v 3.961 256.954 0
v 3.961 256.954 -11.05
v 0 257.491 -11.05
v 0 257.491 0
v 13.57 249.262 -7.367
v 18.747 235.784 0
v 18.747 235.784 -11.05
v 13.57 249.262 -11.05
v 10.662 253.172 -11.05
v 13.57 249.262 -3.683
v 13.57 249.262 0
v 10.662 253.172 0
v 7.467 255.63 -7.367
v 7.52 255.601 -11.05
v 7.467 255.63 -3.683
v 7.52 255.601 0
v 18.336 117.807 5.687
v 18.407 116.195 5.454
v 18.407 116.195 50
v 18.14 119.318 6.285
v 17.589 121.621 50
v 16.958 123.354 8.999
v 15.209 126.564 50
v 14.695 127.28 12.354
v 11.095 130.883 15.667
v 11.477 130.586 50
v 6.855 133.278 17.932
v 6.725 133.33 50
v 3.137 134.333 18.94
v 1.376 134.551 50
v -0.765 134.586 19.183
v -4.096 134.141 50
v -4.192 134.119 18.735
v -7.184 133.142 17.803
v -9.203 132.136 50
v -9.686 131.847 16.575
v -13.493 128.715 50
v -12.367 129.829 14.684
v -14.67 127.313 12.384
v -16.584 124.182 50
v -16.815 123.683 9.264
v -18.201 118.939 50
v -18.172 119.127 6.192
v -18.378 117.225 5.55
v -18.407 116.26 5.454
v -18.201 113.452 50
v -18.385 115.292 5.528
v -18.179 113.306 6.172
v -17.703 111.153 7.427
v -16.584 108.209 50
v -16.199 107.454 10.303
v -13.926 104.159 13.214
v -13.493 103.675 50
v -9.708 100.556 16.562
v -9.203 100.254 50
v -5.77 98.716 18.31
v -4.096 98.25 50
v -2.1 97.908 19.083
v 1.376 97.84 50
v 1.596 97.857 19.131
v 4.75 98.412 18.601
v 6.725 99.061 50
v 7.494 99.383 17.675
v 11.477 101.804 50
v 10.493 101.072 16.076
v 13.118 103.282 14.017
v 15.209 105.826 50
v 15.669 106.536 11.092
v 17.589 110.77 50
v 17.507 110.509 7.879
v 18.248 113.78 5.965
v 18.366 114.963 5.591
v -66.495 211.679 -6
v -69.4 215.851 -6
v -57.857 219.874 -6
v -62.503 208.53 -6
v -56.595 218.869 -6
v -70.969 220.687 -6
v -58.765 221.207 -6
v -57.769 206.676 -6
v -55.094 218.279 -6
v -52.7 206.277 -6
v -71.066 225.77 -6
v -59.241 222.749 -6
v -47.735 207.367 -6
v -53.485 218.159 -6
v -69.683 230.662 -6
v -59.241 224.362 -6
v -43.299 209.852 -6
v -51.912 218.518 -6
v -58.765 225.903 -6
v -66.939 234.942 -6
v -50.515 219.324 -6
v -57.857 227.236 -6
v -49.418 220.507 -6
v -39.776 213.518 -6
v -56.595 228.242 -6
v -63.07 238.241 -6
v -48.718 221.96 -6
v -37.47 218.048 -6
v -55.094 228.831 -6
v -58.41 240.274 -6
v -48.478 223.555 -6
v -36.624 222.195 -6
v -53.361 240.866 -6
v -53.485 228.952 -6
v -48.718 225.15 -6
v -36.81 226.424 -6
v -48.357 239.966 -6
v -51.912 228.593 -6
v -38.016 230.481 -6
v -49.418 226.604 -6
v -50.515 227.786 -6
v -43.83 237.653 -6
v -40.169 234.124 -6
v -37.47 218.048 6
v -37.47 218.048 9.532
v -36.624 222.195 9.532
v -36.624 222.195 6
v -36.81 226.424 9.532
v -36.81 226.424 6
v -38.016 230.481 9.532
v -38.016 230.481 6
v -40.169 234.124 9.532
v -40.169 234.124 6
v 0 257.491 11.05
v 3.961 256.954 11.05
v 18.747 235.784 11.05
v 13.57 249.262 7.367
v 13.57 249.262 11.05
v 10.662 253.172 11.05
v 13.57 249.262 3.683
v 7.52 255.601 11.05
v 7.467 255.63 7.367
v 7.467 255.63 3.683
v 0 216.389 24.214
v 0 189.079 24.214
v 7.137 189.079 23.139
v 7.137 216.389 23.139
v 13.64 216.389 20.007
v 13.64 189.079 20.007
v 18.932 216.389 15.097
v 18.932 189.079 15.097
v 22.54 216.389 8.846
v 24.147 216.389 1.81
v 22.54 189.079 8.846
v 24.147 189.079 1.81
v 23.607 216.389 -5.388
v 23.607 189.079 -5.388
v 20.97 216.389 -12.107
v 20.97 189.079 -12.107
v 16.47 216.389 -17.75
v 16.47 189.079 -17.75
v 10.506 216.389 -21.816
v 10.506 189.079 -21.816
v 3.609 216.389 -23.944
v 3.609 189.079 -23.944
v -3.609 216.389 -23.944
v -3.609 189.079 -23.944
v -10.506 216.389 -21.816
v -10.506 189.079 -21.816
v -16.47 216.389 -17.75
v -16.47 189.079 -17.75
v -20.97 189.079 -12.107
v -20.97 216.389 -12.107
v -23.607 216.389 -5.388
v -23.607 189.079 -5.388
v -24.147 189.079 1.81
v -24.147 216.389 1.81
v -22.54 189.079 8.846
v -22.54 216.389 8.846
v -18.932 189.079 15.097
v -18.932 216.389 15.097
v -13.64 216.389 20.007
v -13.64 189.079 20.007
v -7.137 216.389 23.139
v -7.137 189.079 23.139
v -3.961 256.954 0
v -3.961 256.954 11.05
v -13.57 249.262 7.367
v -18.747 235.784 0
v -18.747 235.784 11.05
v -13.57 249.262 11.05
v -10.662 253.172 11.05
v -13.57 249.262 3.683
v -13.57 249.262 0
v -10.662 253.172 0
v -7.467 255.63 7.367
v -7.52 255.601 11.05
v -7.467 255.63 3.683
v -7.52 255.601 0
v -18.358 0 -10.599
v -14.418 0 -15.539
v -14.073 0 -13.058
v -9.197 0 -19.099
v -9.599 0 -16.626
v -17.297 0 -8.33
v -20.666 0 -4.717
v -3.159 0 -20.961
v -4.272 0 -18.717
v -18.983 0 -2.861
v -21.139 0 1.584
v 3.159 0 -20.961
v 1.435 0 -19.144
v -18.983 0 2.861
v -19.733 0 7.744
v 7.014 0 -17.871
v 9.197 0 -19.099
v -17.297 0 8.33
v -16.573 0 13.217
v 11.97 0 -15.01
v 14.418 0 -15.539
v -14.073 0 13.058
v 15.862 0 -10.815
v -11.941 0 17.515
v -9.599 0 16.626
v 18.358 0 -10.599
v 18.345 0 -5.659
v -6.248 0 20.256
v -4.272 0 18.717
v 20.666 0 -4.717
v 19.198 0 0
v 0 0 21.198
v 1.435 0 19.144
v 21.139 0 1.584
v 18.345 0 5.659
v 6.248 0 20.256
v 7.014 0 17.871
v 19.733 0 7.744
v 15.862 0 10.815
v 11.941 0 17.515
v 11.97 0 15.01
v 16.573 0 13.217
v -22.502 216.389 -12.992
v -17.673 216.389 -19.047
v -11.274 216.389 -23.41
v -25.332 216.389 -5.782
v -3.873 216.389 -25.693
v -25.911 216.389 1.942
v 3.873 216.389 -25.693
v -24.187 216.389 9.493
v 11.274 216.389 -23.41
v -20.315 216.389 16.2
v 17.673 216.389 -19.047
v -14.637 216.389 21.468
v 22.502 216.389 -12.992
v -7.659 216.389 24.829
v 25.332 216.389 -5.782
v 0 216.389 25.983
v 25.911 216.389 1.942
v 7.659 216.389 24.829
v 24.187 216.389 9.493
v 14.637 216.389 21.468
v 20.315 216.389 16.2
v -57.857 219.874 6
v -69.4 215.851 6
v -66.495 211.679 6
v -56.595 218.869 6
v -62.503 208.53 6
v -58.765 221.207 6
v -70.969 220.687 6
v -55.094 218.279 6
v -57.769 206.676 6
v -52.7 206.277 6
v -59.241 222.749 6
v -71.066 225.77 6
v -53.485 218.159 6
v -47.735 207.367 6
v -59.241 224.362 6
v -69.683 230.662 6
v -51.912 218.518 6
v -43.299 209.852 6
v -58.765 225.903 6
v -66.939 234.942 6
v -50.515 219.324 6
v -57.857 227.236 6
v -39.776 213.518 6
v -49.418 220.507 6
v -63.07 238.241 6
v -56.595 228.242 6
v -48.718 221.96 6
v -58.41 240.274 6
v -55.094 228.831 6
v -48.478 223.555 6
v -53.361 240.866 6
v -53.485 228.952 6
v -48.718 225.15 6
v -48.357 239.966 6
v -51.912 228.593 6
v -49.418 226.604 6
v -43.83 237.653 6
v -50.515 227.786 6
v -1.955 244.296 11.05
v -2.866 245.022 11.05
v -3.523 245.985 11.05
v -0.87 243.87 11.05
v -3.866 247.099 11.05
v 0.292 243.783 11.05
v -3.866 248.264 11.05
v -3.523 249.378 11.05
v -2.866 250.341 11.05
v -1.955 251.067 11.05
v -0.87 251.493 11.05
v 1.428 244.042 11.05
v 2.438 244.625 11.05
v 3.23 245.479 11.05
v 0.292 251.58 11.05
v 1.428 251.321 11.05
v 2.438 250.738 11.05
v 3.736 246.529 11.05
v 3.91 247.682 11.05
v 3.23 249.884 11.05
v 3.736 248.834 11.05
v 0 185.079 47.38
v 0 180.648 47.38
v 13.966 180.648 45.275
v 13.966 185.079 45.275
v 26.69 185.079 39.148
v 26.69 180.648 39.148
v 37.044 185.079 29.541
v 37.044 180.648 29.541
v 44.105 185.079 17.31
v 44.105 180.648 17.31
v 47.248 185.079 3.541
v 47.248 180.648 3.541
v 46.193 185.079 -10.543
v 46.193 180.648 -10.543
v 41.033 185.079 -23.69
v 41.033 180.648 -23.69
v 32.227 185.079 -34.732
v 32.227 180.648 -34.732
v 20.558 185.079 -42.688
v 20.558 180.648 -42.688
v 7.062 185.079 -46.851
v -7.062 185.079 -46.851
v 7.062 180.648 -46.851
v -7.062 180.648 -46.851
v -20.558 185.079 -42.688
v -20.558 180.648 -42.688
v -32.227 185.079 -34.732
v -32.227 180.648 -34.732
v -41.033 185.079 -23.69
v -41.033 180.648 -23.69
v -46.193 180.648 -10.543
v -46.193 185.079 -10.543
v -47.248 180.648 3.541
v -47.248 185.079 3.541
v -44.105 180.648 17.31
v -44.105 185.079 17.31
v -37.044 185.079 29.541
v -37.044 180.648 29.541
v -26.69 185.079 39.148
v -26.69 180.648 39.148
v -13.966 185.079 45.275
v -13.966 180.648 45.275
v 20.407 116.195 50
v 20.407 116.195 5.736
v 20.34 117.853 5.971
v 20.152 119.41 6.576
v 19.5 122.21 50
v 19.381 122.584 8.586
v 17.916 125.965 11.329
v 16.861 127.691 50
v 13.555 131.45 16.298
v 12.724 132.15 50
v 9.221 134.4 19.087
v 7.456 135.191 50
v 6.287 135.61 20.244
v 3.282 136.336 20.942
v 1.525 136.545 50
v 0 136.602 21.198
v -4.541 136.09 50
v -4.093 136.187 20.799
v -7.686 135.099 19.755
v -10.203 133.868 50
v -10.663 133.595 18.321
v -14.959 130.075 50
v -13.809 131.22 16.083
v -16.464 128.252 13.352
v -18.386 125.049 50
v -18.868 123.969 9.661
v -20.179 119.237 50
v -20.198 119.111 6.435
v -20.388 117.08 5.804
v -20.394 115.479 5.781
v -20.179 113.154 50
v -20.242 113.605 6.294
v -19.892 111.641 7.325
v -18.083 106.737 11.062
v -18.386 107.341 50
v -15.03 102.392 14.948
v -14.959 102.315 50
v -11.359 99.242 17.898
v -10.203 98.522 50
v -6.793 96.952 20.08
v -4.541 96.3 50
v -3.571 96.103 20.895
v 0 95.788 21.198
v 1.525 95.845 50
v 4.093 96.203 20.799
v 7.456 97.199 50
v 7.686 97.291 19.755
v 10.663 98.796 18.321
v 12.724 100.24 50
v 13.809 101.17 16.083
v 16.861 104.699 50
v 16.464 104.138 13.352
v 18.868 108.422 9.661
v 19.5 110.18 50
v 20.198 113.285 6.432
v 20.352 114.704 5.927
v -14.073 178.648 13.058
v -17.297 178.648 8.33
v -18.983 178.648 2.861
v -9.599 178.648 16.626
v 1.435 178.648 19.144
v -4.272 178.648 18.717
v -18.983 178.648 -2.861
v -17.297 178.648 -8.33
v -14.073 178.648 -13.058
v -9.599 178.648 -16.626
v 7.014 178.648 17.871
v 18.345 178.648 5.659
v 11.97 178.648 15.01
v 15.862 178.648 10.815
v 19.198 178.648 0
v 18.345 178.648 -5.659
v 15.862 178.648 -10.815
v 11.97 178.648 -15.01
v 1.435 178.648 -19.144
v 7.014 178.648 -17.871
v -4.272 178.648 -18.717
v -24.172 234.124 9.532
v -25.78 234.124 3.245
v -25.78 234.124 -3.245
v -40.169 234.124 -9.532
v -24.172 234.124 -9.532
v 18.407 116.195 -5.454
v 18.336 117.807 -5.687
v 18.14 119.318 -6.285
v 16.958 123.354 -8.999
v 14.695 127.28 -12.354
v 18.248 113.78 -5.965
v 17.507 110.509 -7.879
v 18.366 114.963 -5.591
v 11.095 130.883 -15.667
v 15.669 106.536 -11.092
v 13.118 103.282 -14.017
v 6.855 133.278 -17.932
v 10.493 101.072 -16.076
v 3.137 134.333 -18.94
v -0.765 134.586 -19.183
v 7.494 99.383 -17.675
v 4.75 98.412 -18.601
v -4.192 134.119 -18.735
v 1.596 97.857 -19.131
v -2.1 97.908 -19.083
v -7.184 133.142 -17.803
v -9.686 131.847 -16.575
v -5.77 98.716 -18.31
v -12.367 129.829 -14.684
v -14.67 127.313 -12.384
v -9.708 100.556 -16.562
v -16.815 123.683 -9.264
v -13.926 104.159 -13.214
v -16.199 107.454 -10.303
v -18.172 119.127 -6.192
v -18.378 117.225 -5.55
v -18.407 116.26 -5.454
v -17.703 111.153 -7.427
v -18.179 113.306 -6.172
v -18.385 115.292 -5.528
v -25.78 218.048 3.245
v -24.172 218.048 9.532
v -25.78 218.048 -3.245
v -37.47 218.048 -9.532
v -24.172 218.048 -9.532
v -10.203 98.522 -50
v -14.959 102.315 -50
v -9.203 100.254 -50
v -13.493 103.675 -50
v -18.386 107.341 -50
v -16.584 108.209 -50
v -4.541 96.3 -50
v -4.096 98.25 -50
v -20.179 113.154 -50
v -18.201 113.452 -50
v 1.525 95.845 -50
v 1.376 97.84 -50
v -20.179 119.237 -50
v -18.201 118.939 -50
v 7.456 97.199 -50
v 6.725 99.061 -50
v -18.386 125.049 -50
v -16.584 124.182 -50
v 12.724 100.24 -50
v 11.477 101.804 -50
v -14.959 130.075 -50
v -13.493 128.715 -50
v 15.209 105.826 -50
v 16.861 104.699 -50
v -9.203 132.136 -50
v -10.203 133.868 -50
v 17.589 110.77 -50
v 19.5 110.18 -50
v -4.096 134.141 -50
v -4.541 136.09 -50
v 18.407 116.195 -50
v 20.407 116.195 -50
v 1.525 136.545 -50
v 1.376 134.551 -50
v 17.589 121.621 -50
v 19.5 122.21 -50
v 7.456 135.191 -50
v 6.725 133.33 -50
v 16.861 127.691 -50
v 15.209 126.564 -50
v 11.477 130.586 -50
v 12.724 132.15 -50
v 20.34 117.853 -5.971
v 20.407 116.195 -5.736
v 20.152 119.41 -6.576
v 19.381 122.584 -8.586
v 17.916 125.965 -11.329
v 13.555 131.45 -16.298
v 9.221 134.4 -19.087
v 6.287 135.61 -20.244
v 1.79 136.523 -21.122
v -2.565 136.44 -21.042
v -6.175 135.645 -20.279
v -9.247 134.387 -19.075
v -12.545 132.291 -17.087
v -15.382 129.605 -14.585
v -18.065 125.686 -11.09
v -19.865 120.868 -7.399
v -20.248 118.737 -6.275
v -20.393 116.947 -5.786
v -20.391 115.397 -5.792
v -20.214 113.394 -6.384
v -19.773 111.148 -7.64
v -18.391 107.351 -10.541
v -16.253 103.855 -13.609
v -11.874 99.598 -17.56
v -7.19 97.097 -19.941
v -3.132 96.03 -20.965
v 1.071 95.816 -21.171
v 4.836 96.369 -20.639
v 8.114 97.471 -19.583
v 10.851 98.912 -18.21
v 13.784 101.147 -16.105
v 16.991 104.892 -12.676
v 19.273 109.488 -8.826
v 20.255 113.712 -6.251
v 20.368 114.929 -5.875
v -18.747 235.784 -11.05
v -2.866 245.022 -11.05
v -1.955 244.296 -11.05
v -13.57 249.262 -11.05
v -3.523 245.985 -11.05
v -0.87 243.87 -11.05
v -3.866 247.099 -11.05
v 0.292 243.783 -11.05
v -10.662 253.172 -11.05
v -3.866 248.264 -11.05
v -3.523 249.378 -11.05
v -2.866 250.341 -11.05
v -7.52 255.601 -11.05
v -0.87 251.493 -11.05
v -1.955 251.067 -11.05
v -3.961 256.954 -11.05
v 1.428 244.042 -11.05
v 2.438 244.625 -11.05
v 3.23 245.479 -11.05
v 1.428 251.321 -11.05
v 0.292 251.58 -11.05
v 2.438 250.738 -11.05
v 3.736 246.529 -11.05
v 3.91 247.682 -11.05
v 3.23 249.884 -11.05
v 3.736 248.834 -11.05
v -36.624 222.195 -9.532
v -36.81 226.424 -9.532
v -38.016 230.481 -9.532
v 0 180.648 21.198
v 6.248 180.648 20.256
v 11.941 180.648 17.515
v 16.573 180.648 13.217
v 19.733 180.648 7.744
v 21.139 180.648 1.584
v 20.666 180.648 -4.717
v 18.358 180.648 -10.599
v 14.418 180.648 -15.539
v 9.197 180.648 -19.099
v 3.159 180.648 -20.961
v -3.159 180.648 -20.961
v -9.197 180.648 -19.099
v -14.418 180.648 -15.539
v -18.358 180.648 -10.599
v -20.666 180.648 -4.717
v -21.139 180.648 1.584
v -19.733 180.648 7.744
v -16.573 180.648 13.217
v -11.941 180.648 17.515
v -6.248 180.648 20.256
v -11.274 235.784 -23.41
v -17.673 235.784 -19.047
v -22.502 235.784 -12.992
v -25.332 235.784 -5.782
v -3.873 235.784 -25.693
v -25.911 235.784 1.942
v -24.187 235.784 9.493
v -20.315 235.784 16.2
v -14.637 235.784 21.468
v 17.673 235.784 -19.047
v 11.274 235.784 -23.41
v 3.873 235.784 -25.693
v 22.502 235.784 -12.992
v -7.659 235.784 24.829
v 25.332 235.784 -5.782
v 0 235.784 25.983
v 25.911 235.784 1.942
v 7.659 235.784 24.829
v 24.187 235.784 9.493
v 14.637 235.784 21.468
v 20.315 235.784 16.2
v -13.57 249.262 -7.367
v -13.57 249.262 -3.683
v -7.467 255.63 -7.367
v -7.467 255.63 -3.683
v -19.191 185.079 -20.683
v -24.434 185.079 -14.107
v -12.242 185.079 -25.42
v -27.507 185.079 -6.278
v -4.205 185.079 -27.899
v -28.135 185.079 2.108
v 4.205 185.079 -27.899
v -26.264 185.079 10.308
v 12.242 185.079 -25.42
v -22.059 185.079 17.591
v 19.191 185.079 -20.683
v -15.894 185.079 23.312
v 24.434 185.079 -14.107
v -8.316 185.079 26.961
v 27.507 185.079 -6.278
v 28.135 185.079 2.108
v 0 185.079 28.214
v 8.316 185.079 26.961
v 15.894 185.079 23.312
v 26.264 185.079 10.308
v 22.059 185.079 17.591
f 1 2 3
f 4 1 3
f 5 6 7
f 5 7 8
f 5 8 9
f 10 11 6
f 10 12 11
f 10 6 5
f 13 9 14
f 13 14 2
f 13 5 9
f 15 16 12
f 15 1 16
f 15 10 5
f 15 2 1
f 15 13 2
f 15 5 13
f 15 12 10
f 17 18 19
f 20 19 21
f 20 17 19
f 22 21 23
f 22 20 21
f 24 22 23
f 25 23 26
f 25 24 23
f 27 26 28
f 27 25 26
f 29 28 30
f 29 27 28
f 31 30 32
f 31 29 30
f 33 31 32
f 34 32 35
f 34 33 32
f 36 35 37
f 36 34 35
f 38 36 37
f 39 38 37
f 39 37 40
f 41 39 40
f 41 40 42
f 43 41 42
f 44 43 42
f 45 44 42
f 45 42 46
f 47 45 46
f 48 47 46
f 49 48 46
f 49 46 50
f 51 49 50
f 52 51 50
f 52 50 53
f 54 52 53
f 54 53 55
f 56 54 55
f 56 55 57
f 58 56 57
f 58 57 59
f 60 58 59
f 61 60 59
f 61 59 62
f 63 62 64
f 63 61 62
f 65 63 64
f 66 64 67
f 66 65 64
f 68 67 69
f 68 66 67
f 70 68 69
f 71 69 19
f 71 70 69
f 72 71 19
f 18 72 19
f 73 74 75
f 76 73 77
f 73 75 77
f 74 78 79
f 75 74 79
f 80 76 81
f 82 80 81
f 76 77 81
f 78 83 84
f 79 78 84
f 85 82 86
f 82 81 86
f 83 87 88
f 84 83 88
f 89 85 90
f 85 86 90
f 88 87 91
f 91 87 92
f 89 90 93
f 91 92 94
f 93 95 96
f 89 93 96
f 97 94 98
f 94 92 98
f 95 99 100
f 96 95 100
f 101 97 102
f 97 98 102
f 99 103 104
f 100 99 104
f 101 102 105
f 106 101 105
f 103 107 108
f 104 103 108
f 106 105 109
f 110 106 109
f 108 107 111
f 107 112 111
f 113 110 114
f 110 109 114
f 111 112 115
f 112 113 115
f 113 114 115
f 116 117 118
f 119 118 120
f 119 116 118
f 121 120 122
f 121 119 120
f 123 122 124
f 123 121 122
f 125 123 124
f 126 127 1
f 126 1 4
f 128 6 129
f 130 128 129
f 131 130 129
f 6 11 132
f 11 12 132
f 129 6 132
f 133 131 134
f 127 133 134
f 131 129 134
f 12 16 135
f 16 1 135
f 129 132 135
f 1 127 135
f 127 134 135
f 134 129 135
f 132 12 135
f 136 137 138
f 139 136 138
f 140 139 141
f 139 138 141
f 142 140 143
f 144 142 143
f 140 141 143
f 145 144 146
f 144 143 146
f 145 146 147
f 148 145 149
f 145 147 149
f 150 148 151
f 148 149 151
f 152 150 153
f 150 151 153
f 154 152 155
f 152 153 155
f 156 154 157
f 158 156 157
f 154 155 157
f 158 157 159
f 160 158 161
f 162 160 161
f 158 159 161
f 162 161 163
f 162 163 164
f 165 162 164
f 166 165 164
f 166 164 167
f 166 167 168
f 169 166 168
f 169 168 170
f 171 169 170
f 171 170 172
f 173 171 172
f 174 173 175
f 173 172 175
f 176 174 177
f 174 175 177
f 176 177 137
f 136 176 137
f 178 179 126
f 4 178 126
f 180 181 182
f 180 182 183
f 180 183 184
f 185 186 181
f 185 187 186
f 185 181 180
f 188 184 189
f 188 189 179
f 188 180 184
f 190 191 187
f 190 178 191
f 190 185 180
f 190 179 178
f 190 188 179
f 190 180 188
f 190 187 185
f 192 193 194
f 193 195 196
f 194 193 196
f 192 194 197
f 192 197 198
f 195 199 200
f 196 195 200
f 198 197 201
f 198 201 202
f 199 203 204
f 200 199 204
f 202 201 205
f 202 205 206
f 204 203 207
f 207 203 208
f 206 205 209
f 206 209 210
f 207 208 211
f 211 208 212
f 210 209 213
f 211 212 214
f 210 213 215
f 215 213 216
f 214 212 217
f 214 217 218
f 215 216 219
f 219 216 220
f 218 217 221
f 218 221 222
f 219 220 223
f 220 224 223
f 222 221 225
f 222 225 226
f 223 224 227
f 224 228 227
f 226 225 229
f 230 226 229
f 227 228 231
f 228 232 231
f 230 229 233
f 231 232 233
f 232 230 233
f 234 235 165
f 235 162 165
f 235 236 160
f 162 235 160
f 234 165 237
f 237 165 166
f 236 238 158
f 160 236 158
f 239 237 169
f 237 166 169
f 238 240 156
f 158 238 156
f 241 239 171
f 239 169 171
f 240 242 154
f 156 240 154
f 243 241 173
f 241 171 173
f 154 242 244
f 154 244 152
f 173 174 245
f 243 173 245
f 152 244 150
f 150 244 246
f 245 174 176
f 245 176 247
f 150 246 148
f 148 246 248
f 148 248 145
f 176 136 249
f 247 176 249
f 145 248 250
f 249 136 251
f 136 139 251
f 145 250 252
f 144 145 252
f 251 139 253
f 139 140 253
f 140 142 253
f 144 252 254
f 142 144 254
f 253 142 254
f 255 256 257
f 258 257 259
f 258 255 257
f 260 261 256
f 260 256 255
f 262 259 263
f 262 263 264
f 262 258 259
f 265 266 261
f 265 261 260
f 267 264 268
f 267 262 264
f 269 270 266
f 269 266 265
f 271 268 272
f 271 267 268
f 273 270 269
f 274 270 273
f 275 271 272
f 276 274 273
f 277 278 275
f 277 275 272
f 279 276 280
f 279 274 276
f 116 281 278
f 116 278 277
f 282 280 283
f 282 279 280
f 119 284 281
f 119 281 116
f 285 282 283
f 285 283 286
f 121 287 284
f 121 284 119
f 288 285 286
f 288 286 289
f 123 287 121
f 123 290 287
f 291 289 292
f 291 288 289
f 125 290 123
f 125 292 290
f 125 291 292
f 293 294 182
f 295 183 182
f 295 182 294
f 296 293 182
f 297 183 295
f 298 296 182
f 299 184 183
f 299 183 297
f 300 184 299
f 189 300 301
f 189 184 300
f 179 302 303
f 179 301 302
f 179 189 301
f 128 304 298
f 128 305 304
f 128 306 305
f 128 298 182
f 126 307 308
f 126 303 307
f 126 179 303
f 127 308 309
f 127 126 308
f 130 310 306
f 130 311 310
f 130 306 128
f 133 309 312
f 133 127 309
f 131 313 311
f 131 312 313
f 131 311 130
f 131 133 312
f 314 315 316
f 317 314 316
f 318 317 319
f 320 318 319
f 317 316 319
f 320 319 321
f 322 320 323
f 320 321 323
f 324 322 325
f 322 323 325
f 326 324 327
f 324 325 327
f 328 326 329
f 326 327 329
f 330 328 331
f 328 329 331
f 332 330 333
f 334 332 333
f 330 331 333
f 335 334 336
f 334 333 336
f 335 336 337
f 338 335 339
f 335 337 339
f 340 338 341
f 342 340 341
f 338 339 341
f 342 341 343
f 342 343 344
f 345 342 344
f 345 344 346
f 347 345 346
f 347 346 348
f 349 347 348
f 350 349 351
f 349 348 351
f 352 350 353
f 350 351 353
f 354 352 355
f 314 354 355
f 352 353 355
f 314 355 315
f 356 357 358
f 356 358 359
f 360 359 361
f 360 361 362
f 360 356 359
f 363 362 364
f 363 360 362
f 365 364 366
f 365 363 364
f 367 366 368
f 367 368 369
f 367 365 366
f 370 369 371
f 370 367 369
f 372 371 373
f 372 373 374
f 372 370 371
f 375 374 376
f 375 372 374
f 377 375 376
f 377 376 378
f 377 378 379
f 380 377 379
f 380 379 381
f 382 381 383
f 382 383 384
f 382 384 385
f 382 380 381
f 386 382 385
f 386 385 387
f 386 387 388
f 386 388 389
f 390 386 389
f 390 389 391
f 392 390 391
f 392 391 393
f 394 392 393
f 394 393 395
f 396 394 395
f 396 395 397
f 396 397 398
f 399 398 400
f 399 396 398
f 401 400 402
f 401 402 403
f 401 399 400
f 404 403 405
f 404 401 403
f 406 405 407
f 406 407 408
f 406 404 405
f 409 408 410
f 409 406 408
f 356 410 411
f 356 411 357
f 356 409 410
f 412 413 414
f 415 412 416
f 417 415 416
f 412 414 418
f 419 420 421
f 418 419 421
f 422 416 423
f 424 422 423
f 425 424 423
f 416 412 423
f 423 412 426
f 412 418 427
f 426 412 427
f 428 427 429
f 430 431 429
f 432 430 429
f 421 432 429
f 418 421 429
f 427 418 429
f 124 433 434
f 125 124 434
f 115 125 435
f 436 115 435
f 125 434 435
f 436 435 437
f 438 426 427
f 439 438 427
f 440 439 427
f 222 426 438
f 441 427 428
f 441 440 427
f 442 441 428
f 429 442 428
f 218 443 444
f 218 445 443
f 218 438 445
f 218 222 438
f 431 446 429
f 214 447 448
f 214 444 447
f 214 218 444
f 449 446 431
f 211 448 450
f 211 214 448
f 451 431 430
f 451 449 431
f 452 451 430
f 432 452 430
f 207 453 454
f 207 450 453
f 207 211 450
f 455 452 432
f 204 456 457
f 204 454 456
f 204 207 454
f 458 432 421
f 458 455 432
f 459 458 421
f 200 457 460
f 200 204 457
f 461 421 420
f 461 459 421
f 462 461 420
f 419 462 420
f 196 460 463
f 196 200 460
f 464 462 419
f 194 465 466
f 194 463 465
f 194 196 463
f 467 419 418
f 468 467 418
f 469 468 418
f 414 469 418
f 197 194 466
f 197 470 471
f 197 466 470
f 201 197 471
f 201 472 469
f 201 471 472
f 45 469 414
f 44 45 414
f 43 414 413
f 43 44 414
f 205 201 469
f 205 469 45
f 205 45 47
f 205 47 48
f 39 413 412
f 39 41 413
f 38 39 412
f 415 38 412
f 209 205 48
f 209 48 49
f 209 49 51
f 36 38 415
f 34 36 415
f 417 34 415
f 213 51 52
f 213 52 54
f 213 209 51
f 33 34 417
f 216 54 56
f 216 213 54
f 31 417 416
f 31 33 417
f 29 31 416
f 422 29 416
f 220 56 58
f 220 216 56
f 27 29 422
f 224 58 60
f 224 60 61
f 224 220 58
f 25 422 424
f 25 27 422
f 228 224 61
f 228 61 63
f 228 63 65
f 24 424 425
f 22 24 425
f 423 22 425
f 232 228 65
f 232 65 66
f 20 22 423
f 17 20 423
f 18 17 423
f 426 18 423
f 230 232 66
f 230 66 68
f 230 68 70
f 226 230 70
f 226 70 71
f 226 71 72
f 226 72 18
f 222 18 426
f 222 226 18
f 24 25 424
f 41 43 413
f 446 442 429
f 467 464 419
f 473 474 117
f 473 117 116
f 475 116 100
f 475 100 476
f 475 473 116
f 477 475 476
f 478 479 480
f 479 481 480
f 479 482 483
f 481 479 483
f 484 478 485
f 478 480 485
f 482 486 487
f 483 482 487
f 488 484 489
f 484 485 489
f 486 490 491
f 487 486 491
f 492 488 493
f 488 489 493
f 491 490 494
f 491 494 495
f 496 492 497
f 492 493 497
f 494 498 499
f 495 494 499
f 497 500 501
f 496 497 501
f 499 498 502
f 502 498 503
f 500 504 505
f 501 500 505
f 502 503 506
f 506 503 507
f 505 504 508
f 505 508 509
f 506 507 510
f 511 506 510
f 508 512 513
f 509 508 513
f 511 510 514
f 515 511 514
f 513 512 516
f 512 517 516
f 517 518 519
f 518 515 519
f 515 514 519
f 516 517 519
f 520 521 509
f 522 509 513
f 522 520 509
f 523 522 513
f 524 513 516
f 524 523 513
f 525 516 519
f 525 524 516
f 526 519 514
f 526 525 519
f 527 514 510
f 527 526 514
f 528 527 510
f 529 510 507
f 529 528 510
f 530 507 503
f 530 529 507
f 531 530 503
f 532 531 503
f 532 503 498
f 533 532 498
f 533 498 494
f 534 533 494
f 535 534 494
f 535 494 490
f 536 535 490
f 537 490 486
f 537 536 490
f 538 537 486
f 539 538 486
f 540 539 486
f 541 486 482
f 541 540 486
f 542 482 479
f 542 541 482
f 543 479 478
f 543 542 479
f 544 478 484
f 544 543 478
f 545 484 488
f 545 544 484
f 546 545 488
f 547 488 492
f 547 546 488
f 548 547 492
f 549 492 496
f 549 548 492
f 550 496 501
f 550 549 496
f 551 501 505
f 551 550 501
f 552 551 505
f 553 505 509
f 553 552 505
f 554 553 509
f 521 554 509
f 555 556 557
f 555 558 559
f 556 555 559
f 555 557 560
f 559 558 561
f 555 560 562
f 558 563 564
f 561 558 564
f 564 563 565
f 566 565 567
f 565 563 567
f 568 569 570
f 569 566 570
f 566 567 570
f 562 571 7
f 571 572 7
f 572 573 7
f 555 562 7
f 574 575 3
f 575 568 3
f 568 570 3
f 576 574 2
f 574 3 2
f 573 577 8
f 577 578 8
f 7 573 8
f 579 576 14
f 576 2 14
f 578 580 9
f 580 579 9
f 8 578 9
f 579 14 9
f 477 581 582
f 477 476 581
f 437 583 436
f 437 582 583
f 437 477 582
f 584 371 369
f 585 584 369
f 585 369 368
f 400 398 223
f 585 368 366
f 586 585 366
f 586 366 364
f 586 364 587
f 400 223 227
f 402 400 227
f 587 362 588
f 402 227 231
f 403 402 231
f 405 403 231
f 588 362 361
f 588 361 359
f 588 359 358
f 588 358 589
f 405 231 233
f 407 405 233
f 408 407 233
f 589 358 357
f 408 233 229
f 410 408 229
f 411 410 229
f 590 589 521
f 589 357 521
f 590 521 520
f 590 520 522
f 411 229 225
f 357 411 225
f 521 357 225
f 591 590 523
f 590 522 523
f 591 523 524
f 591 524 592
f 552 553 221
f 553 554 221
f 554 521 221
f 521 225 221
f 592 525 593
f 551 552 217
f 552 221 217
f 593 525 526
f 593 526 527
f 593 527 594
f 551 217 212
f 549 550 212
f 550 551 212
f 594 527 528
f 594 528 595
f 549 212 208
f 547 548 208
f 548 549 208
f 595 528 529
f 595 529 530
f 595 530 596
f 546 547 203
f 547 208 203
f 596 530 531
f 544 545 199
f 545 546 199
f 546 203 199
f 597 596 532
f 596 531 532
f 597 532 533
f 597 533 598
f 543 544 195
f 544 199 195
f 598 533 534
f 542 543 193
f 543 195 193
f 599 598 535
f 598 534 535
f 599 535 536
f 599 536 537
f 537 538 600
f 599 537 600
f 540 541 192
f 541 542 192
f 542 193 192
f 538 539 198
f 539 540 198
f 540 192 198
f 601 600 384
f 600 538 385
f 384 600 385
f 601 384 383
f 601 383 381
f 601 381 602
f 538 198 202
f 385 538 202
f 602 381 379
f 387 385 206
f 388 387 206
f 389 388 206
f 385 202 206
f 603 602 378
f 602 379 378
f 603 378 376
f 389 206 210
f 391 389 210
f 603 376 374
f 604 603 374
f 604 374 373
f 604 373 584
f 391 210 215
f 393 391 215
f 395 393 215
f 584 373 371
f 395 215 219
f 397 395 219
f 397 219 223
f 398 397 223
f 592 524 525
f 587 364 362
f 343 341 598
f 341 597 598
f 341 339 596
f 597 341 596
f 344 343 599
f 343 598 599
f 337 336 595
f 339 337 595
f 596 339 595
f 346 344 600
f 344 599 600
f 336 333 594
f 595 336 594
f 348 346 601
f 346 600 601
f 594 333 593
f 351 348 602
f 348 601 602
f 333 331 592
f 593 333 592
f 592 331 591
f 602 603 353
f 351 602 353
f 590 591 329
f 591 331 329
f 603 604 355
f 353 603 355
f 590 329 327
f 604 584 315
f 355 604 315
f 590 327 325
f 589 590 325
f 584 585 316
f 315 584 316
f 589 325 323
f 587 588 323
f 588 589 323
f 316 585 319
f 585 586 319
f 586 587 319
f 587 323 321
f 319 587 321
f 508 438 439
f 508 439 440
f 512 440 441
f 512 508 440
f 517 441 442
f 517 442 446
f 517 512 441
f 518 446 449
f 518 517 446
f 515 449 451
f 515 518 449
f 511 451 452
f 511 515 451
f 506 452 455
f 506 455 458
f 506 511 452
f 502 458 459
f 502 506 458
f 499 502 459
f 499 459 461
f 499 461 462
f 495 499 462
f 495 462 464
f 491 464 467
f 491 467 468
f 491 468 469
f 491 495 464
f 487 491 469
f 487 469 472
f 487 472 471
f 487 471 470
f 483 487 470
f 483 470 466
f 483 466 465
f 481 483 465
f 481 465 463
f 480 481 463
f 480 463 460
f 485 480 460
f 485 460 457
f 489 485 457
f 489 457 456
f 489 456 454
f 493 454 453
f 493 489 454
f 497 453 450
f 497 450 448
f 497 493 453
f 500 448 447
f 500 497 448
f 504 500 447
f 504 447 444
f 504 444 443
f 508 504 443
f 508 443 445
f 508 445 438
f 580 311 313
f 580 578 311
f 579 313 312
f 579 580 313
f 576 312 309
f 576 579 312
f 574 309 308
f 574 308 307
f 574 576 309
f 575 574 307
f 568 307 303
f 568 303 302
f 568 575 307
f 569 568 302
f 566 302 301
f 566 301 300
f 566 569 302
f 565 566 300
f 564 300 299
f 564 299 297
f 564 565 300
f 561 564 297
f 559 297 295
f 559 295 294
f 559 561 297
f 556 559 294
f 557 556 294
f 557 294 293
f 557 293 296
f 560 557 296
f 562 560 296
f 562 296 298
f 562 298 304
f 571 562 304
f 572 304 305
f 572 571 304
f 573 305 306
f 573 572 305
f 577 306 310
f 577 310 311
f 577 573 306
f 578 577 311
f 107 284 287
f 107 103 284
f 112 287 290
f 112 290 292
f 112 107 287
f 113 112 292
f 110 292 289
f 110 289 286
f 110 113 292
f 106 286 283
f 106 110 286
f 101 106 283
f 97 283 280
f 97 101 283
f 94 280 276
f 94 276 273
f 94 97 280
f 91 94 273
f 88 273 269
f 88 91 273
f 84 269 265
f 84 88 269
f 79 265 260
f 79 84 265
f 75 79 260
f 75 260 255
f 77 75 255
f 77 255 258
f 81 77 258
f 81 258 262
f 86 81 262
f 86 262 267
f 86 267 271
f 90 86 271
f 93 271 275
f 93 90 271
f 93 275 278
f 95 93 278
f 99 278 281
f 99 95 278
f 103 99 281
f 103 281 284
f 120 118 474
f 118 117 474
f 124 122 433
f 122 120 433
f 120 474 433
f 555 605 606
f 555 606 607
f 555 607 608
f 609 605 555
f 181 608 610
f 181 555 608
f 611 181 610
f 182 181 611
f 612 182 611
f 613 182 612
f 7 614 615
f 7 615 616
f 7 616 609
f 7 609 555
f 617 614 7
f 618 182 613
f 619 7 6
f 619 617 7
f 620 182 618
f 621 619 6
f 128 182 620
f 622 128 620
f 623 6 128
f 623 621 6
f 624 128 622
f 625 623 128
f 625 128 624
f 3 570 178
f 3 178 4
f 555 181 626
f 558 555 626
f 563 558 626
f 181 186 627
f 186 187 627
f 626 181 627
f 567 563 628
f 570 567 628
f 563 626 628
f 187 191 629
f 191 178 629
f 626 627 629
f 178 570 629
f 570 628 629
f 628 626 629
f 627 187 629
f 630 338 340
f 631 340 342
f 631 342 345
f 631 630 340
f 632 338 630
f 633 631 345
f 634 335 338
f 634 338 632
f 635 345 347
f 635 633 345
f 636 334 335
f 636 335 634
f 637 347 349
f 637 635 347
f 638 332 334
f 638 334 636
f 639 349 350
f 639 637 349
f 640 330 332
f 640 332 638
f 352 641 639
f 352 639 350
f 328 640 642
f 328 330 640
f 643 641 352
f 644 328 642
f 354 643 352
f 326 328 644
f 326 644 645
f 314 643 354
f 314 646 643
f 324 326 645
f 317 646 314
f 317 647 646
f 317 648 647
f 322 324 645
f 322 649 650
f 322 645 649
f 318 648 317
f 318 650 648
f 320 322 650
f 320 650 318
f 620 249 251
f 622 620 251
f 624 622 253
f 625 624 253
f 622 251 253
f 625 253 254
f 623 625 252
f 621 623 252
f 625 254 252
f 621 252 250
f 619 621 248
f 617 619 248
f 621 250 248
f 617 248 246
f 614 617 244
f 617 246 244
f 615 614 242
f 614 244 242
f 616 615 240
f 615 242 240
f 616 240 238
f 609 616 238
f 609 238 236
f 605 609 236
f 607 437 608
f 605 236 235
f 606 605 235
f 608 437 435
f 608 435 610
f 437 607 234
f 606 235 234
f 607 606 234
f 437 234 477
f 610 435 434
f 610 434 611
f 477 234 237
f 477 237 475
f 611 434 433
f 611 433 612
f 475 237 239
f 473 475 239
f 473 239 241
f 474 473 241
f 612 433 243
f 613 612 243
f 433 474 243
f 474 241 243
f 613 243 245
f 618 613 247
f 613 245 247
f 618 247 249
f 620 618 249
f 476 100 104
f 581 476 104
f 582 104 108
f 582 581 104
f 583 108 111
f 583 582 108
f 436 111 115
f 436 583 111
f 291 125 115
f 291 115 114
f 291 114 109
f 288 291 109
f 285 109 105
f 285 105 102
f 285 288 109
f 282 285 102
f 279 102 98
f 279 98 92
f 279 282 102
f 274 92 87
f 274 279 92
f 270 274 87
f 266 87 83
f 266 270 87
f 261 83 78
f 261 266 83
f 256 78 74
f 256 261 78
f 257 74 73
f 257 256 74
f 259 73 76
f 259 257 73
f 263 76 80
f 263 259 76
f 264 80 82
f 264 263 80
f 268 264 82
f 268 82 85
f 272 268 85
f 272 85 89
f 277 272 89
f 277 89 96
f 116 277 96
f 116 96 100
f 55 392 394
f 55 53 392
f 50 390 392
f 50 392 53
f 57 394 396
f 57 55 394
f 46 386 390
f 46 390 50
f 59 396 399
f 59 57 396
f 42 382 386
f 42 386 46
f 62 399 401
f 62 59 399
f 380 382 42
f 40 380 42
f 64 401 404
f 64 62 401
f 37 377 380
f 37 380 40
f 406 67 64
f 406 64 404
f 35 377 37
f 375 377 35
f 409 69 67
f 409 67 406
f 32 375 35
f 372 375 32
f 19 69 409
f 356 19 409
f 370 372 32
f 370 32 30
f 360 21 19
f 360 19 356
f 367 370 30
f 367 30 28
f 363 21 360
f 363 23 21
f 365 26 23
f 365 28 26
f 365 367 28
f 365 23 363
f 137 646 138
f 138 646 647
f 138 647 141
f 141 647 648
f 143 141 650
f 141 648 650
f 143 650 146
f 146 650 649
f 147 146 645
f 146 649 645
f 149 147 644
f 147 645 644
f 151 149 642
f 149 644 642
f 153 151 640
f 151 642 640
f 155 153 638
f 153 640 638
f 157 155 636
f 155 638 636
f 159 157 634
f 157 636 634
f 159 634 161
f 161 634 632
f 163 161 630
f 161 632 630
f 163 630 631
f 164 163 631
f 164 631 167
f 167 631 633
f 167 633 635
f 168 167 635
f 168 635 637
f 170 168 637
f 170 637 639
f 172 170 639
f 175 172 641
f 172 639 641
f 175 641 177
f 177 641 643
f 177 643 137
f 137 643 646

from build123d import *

# Parameters (mm, degrees)
SKETCH7_R           = 21.1979112
BOSS_EXTRUDE1_DEPTH = 180.647627
SKETCH12_R          = 20.406966807
BOSS_EXTRUDE6_DEPTH = 50
SHELL1_START        = -50
SHELL1_OUTLINE_R    = 18.406966807
SHELL1_DEPTH        = 100
SHELL1_2_OUTLINE_R  = 19.1979112
SHELL1_2_DEPTH      = 178.6476265
SKETCH8_R           = 47.3804642
BOSS_EXTRUDE2_DEPTH = 4.431169
SKETCH9_R           = 24.21431875
BOSS_EXTRUDE3_DEPTH = 31.309755
SKETCH10_R          = 25.98338315
BOSS_EXTRUDE4_DEPTH = 19.395214
CHAMFER1_SIZE       = 4
SKETCH11_R          = 3.909700179
BOSS_EXTRUDE5_DEPTH = 11.05
SKETCH13_W          = 19.064805676
SKETCH13_H          = 16.075701836
BOSS_EXTRUDE7_DEPTH = 52
SKETCH14_R          = 17.318879346
SKETCH14_R_2        = 11.636848892
SKETCH14_R_3        = 5.411731441
CUT_EXTRUDE1_DEPTH  = 26
SKETCH14_5_R        = 17.318879346
SKETCH14_5_R_2      = 5.411731441
BOSS_EXTRUDE9_DEPTH = 6


with BuildPart() as part:
    # Sketch7 → Boss-Extrude1 (new body)
    with BuildSketch(Plane(origin=(0, 0, 0), x_dir=(1, 0, 0), z_dir=(0, 1, 0))):
        with Locations(Location((0, 0, 0), (0, 0, 270))):
            Circle(SKETCH7_R)
    extrude(amount=BOSS_EXTRUDE1_DEPTH)

    # Sketch12 → Boss-Extrude6 (add, symmetric)
    with BuildSketch(Plane.XY):
        with Locations((0, 116.195122616)):
            Circle(SKETCH12_R)
    extrude(amount=BOSS_EXTRUDE6_DEPTH, both=True)

    # Shell1: read off the stored shape, not the designer's step
    # Shell1 outline → Shell1 (cut)
    with BuildSketch(Plane.XY.offset(SHELL1_START)):
        with Locations((0, 116.195122616)):
            Circle(SHELL1_OUTLINE_R)
    extrude(amount=SHELL1_DEPTH, mode=Mode.SUBTRACT)

    # Shell1 2 outline → Shell1 2 (cut)
    with BuildSketch(Plane(origin=(0, 0, 0), x_dir=(1, 0, 0), z_dir=(0, 1, 0))):
        Circle(SHELL1_2_OUTLINE_R)
    extrude(amount=SHELL1_2_DEPTH, mode=Mode.SUBTRACT)

    # Sketch8 → Boss-Extrude2 (add)
    with BuildSketch(Plane(origin=(0, 180.6476265, 0), x_dir=(1, 0, 0), z_dir=(0, 1, 0))):
        with Locations(Location((0, 0, 0), (0, 0, 270))):
            Circle(SKETCH8_R)
    extrude(amount=BOSS_EXTRUDE2_DEPTH)

    # Sketch9 → Boss-Extrude3 (add)
    with BuildSketch(Plane(origin=(0, 185.0787951, 0), x_dir=(1, 0, 0), z_dir=(0, 1, 0))):
        with Locations(Location((0, 0, 0), (0, 0, 270))):
            Circle(SKETCH9_R)
    extrude(amount=BOSS_EXTRUDE3_DEPTH)

    # Sketch10 → Boss-Extrude4 (add)
    with BuildSketch(Plane(origin=(0, 216.3885498, 0), x_dir=(1, 0, 0), z_dir=(0, 1, 0))):
        with Locations(Location((0, 0, 0), (0, 0, 270))):
            Circle(SKETCH10_R)
    extrude(amount=BOSS_EXTRUDE4_DEPTH)

    # Chamfer1
    chamfer1_edges = [part.edges().sort_by_distance(p)[0] for p in [
        (0, 185.0787951, -24.21431875),
    ]]
    chamfer(chamfer1_edges, length=CHAMFER1_SIZE)

    # Sketch11 → Boss-Extrude5 (add, symmetric)
    with BuildSketch(Plane.XY):
        with BuildLine():
            Line((-18.74694623, 235.7837635), (18.74694623, 235.7837635))
            add(Edge.make_bspline(
                [(18.74694623, 235.7837635), (13.888692834, 253.685965272), (8.293919463, 257.014643256), (0, 257.491213049)],
                knots=[0, 0, 0, 0, 0.516374354, 0.516374354, 0.516374354, 0.516374354], degree=3))
            add(Edge.make_bspline(
                [(-18.74694623, 235.7837635), (-13.888692834, 253.685965272), (-8.293919463, 257.014643256), (0, 257.491213049)],
                knots=[0, 0, 0, 0, 0.516374354, 0.516374354, 0.516374354, 0.516374354], degree=3))
        make_face()
        with Locations((0, 247.681579845)):
            Circle(SKETCH11_R, mode=Mode.SUBTRACT)
    extrude(amount=BOSS_EXTRUDE5_DEPTH, both=True)

    # Sketch13 → Boss-Extrude7 (add)
    with BuildSketch(Plane(origin=(0, 0, 0), x_dir=(0, 0, -1), z_dir=(1, 0, 0))):
        with Locations((0, 226.08615665)):
            Rectangle(SKETCH13_W, SKETCH13_H)
    extrude(amount=-BOSS_EXTRUDE7_DEPTH)

    # Sketch14 → Cut-Extrude1 (cut, symmetric)
    # profile 1 of 2: a face of its own
    with BuildSketch(Plane.XY):
        with Locations((-53.889606886, 223.55520268)):
            Circle(SKETCH14_R)
        with Locations((-53.889606886, 223.55520268)):
            Circle(SKETCH14_R_2, mode=Mode.SUBTRACT)
    # profile 2 of 2: a face of its own
    with BuildSketch(Plane.XY):
        with Locations((-53.889606886, 223.55520268)):
            Circle(SKETCH14_R_3)
    extrude(amount=CUT_EXTRUDE1_DEPTH, both=True, mode=Mode.SUBTRACT)


with BuildPart() as cut_extrude1_kept_piece:
    # of the separate pieces the step leaves, the one the design keeps (cut_extrude1_pieces_kept)
    add(part.part.solids().sort_by_distance((0, 189.0787955, 24.21431875))[0])

    # Sketch14<5> → Boss-Extrude9 (add, symmetric)
    with BuildSketch(Plane.XY):
        with Locations((-53.889606886, 223.55520268)):
            Circle(SKETCH14_5_R)
        with Locations((-53.889606886, 223.55520268)):
            Circle(SKETCH14_5_R_2, mode=Mode.SUBTRACT)
    extrude(amount=BOSS_EXTRUDE9_DEPTH, both=True)


solid = cut_extrude1_kept_piece.part
